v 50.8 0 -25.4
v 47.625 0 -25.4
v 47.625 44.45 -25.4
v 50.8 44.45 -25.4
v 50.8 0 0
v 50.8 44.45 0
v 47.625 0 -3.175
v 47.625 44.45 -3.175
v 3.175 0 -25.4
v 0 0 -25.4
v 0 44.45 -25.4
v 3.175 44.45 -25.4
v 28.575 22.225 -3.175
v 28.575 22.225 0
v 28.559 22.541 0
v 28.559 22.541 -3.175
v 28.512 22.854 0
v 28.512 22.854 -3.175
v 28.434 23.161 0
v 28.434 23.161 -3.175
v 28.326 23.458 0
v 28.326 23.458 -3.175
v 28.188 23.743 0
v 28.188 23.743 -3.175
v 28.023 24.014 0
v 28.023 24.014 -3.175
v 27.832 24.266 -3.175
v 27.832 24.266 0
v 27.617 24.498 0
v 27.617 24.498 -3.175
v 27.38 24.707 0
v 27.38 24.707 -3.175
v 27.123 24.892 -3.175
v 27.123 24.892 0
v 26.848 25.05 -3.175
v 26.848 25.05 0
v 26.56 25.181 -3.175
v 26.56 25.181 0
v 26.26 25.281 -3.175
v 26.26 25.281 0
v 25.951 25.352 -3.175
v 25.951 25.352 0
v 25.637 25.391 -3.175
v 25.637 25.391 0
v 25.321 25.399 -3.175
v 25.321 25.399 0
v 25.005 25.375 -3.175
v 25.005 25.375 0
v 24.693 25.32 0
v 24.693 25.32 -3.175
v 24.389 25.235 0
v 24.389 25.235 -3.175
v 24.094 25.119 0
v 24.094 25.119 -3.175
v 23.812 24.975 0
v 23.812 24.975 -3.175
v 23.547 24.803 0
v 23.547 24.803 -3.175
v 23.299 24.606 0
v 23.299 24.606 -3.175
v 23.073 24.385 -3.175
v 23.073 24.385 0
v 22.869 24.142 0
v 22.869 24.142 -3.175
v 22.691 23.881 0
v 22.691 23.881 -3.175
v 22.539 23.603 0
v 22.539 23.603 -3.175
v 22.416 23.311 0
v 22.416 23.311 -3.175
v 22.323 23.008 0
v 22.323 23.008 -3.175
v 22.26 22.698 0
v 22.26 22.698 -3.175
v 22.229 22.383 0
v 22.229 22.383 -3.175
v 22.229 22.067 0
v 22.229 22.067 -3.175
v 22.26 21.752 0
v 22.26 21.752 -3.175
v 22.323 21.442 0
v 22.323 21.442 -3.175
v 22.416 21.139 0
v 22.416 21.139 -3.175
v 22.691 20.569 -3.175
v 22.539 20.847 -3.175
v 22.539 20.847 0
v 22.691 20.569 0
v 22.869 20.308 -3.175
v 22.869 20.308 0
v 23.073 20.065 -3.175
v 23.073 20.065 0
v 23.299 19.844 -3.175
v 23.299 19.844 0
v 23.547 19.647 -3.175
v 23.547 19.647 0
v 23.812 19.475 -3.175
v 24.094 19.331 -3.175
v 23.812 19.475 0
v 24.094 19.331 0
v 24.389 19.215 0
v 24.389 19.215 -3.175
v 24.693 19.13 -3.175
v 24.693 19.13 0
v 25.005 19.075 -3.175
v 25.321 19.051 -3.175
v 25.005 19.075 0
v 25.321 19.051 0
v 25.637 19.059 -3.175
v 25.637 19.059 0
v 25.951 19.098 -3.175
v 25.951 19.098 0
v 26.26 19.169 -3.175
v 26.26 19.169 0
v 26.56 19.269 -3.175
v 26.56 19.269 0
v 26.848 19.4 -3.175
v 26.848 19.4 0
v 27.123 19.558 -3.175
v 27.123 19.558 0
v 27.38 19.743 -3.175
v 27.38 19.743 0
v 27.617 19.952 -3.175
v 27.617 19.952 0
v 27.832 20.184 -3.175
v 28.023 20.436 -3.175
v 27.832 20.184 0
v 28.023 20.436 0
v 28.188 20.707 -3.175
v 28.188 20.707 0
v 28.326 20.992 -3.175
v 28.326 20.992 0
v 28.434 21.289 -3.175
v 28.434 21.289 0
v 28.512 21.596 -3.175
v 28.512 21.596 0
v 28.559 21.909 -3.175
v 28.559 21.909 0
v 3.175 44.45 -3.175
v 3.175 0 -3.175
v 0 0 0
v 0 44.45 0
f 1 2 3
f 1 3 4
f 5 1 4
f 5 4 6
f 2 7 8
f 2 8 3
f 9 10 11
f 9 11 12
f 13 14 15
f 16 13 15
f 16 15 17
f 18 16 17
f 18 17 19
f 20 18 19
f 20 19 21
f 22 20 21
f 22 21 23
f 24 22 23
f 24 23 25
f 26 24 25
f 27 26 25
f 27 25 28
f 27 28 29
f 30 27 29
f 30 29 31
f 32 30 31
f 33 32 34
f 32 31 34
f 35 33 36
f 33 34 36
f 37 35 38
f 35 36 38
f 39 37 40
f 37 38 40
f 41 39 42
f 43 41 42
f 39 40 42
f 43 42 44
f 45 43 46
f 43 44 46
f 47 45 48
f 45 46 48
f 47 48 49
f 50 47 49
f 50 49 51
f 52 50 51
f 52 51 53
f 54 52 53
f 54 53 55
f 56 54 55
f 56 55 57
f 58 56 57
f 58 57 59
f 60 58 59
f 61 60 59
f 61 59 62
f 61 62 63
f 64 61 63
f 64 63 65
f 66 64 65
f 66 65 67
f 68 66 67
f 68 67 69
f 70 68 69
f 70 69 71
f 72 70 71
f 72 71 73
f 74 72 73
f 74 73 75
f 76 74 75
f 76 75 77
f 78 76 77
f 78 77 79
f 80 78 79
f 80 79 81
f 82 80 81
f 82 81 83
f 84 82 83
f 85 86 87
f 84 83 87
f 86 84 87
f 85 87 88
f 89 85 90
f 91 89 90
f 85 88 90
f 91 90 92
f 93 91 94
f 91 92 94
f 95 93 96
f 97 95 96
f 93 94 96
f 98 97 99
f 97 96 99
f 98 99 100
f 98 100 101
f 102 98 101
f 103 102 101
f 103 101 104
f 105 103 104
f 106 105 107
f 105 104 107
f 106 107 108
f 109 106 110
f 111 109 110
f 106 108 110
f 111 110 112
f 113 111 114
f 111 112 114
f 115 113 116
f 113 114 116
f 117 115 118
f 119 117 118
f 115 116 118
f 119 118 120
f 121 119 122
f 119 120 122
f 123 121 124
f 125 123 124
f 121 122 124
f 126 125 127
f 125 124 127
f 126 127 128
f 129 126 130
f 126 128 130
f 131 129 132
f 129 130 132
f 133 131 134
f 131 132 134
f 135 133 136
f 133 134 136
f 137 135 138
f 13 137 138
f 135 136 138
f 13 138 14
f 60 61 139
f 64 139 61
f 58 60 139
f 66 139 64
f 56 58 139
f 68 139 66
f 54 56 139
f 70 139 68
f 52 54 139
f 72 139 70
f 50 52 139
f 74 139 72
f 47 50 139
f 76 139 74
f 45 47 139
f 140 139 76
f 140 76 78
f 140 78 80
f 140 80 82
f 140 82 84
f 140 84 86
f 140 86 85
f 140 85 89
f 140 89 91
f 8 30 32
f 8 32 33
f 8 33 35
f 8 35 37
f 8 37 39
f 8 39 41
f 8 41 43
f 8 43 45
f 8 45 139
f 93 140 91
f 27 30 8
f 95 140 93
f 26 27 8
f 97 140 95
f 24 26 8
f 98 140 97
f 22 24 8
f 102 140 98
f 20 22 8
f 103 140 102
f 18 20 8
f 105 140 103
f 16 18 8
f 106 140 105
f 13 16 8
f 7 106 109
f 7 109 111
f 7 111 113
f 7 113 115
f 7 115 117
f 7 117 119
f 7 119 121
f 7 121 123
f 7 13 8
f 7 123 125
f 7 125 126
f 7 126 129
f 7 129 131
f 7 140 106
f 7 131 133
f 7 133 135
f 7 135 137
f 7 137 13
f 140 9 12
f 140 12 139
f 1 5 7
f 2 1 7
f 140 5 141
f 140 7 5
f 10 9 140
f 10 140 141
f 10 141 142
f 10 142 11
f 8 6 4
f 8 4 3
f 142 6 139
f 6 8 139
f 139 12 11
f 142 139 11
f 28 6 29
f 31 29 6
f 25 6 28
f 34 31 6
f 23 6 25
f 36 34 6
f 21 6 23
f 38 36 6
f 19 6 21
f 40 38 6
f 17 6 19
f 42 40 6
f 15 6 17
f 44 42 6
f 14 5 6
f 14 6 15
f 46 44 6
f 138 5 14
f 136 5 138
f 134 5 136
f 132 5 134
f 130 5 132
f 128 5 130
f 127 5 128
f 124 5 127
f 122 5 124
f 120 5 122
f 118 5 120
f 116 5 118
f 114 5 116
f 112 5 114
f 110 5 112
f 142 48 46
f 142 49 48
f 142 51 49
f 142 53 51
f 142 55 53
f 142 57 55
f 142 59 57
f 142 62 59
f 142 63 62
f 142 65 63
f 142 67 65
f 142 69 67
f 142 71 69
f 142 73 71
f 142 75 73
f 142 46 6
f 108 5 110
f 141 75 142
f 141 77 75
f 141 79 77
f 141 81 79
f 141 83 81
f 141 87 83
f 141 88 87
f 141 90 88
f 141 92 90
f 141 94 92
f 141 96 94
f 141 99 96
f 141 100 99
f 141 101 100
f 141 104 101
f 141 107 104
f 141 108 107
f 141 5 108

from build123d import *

# Parameters (mm, degrees)
BOSS_EXTRUDE1_DEPTH = 44.45
SKETCH2_R           = 3.175
CUT_EXTRUDE1_DEPTH  = 73.122135992


with BuildPart() as part:
    # Sketch1 → Boss-Extrude1 (new body)
    with BuildSketch(Plane(origin=(0, 0, 0), x_dir=(1, 0, 0), z_dir=(0, 1, 0))):
        Polygon((47.625, 25.4), (50.8, 25.4), (50.8, 0), (0, 0), (0, 25.4), (3.175, 25.4), (3.175, 3.175), (47.625, 3.175), align=None)
    extrude(amount=BOSS_EXTRUDE1_DEPTH)

    # Sketch2 → Cut-Extrude1 (cut, through all)
    with BuildSketch(Plane.XY):
        with Locations((25.4, 22.225)):
            Circle(SKETCH2_R)
    extrude(amount=-CUT_EXTRUDE1_DEPTH, mode=Mode.SUBTRACT)


solid = part.part
